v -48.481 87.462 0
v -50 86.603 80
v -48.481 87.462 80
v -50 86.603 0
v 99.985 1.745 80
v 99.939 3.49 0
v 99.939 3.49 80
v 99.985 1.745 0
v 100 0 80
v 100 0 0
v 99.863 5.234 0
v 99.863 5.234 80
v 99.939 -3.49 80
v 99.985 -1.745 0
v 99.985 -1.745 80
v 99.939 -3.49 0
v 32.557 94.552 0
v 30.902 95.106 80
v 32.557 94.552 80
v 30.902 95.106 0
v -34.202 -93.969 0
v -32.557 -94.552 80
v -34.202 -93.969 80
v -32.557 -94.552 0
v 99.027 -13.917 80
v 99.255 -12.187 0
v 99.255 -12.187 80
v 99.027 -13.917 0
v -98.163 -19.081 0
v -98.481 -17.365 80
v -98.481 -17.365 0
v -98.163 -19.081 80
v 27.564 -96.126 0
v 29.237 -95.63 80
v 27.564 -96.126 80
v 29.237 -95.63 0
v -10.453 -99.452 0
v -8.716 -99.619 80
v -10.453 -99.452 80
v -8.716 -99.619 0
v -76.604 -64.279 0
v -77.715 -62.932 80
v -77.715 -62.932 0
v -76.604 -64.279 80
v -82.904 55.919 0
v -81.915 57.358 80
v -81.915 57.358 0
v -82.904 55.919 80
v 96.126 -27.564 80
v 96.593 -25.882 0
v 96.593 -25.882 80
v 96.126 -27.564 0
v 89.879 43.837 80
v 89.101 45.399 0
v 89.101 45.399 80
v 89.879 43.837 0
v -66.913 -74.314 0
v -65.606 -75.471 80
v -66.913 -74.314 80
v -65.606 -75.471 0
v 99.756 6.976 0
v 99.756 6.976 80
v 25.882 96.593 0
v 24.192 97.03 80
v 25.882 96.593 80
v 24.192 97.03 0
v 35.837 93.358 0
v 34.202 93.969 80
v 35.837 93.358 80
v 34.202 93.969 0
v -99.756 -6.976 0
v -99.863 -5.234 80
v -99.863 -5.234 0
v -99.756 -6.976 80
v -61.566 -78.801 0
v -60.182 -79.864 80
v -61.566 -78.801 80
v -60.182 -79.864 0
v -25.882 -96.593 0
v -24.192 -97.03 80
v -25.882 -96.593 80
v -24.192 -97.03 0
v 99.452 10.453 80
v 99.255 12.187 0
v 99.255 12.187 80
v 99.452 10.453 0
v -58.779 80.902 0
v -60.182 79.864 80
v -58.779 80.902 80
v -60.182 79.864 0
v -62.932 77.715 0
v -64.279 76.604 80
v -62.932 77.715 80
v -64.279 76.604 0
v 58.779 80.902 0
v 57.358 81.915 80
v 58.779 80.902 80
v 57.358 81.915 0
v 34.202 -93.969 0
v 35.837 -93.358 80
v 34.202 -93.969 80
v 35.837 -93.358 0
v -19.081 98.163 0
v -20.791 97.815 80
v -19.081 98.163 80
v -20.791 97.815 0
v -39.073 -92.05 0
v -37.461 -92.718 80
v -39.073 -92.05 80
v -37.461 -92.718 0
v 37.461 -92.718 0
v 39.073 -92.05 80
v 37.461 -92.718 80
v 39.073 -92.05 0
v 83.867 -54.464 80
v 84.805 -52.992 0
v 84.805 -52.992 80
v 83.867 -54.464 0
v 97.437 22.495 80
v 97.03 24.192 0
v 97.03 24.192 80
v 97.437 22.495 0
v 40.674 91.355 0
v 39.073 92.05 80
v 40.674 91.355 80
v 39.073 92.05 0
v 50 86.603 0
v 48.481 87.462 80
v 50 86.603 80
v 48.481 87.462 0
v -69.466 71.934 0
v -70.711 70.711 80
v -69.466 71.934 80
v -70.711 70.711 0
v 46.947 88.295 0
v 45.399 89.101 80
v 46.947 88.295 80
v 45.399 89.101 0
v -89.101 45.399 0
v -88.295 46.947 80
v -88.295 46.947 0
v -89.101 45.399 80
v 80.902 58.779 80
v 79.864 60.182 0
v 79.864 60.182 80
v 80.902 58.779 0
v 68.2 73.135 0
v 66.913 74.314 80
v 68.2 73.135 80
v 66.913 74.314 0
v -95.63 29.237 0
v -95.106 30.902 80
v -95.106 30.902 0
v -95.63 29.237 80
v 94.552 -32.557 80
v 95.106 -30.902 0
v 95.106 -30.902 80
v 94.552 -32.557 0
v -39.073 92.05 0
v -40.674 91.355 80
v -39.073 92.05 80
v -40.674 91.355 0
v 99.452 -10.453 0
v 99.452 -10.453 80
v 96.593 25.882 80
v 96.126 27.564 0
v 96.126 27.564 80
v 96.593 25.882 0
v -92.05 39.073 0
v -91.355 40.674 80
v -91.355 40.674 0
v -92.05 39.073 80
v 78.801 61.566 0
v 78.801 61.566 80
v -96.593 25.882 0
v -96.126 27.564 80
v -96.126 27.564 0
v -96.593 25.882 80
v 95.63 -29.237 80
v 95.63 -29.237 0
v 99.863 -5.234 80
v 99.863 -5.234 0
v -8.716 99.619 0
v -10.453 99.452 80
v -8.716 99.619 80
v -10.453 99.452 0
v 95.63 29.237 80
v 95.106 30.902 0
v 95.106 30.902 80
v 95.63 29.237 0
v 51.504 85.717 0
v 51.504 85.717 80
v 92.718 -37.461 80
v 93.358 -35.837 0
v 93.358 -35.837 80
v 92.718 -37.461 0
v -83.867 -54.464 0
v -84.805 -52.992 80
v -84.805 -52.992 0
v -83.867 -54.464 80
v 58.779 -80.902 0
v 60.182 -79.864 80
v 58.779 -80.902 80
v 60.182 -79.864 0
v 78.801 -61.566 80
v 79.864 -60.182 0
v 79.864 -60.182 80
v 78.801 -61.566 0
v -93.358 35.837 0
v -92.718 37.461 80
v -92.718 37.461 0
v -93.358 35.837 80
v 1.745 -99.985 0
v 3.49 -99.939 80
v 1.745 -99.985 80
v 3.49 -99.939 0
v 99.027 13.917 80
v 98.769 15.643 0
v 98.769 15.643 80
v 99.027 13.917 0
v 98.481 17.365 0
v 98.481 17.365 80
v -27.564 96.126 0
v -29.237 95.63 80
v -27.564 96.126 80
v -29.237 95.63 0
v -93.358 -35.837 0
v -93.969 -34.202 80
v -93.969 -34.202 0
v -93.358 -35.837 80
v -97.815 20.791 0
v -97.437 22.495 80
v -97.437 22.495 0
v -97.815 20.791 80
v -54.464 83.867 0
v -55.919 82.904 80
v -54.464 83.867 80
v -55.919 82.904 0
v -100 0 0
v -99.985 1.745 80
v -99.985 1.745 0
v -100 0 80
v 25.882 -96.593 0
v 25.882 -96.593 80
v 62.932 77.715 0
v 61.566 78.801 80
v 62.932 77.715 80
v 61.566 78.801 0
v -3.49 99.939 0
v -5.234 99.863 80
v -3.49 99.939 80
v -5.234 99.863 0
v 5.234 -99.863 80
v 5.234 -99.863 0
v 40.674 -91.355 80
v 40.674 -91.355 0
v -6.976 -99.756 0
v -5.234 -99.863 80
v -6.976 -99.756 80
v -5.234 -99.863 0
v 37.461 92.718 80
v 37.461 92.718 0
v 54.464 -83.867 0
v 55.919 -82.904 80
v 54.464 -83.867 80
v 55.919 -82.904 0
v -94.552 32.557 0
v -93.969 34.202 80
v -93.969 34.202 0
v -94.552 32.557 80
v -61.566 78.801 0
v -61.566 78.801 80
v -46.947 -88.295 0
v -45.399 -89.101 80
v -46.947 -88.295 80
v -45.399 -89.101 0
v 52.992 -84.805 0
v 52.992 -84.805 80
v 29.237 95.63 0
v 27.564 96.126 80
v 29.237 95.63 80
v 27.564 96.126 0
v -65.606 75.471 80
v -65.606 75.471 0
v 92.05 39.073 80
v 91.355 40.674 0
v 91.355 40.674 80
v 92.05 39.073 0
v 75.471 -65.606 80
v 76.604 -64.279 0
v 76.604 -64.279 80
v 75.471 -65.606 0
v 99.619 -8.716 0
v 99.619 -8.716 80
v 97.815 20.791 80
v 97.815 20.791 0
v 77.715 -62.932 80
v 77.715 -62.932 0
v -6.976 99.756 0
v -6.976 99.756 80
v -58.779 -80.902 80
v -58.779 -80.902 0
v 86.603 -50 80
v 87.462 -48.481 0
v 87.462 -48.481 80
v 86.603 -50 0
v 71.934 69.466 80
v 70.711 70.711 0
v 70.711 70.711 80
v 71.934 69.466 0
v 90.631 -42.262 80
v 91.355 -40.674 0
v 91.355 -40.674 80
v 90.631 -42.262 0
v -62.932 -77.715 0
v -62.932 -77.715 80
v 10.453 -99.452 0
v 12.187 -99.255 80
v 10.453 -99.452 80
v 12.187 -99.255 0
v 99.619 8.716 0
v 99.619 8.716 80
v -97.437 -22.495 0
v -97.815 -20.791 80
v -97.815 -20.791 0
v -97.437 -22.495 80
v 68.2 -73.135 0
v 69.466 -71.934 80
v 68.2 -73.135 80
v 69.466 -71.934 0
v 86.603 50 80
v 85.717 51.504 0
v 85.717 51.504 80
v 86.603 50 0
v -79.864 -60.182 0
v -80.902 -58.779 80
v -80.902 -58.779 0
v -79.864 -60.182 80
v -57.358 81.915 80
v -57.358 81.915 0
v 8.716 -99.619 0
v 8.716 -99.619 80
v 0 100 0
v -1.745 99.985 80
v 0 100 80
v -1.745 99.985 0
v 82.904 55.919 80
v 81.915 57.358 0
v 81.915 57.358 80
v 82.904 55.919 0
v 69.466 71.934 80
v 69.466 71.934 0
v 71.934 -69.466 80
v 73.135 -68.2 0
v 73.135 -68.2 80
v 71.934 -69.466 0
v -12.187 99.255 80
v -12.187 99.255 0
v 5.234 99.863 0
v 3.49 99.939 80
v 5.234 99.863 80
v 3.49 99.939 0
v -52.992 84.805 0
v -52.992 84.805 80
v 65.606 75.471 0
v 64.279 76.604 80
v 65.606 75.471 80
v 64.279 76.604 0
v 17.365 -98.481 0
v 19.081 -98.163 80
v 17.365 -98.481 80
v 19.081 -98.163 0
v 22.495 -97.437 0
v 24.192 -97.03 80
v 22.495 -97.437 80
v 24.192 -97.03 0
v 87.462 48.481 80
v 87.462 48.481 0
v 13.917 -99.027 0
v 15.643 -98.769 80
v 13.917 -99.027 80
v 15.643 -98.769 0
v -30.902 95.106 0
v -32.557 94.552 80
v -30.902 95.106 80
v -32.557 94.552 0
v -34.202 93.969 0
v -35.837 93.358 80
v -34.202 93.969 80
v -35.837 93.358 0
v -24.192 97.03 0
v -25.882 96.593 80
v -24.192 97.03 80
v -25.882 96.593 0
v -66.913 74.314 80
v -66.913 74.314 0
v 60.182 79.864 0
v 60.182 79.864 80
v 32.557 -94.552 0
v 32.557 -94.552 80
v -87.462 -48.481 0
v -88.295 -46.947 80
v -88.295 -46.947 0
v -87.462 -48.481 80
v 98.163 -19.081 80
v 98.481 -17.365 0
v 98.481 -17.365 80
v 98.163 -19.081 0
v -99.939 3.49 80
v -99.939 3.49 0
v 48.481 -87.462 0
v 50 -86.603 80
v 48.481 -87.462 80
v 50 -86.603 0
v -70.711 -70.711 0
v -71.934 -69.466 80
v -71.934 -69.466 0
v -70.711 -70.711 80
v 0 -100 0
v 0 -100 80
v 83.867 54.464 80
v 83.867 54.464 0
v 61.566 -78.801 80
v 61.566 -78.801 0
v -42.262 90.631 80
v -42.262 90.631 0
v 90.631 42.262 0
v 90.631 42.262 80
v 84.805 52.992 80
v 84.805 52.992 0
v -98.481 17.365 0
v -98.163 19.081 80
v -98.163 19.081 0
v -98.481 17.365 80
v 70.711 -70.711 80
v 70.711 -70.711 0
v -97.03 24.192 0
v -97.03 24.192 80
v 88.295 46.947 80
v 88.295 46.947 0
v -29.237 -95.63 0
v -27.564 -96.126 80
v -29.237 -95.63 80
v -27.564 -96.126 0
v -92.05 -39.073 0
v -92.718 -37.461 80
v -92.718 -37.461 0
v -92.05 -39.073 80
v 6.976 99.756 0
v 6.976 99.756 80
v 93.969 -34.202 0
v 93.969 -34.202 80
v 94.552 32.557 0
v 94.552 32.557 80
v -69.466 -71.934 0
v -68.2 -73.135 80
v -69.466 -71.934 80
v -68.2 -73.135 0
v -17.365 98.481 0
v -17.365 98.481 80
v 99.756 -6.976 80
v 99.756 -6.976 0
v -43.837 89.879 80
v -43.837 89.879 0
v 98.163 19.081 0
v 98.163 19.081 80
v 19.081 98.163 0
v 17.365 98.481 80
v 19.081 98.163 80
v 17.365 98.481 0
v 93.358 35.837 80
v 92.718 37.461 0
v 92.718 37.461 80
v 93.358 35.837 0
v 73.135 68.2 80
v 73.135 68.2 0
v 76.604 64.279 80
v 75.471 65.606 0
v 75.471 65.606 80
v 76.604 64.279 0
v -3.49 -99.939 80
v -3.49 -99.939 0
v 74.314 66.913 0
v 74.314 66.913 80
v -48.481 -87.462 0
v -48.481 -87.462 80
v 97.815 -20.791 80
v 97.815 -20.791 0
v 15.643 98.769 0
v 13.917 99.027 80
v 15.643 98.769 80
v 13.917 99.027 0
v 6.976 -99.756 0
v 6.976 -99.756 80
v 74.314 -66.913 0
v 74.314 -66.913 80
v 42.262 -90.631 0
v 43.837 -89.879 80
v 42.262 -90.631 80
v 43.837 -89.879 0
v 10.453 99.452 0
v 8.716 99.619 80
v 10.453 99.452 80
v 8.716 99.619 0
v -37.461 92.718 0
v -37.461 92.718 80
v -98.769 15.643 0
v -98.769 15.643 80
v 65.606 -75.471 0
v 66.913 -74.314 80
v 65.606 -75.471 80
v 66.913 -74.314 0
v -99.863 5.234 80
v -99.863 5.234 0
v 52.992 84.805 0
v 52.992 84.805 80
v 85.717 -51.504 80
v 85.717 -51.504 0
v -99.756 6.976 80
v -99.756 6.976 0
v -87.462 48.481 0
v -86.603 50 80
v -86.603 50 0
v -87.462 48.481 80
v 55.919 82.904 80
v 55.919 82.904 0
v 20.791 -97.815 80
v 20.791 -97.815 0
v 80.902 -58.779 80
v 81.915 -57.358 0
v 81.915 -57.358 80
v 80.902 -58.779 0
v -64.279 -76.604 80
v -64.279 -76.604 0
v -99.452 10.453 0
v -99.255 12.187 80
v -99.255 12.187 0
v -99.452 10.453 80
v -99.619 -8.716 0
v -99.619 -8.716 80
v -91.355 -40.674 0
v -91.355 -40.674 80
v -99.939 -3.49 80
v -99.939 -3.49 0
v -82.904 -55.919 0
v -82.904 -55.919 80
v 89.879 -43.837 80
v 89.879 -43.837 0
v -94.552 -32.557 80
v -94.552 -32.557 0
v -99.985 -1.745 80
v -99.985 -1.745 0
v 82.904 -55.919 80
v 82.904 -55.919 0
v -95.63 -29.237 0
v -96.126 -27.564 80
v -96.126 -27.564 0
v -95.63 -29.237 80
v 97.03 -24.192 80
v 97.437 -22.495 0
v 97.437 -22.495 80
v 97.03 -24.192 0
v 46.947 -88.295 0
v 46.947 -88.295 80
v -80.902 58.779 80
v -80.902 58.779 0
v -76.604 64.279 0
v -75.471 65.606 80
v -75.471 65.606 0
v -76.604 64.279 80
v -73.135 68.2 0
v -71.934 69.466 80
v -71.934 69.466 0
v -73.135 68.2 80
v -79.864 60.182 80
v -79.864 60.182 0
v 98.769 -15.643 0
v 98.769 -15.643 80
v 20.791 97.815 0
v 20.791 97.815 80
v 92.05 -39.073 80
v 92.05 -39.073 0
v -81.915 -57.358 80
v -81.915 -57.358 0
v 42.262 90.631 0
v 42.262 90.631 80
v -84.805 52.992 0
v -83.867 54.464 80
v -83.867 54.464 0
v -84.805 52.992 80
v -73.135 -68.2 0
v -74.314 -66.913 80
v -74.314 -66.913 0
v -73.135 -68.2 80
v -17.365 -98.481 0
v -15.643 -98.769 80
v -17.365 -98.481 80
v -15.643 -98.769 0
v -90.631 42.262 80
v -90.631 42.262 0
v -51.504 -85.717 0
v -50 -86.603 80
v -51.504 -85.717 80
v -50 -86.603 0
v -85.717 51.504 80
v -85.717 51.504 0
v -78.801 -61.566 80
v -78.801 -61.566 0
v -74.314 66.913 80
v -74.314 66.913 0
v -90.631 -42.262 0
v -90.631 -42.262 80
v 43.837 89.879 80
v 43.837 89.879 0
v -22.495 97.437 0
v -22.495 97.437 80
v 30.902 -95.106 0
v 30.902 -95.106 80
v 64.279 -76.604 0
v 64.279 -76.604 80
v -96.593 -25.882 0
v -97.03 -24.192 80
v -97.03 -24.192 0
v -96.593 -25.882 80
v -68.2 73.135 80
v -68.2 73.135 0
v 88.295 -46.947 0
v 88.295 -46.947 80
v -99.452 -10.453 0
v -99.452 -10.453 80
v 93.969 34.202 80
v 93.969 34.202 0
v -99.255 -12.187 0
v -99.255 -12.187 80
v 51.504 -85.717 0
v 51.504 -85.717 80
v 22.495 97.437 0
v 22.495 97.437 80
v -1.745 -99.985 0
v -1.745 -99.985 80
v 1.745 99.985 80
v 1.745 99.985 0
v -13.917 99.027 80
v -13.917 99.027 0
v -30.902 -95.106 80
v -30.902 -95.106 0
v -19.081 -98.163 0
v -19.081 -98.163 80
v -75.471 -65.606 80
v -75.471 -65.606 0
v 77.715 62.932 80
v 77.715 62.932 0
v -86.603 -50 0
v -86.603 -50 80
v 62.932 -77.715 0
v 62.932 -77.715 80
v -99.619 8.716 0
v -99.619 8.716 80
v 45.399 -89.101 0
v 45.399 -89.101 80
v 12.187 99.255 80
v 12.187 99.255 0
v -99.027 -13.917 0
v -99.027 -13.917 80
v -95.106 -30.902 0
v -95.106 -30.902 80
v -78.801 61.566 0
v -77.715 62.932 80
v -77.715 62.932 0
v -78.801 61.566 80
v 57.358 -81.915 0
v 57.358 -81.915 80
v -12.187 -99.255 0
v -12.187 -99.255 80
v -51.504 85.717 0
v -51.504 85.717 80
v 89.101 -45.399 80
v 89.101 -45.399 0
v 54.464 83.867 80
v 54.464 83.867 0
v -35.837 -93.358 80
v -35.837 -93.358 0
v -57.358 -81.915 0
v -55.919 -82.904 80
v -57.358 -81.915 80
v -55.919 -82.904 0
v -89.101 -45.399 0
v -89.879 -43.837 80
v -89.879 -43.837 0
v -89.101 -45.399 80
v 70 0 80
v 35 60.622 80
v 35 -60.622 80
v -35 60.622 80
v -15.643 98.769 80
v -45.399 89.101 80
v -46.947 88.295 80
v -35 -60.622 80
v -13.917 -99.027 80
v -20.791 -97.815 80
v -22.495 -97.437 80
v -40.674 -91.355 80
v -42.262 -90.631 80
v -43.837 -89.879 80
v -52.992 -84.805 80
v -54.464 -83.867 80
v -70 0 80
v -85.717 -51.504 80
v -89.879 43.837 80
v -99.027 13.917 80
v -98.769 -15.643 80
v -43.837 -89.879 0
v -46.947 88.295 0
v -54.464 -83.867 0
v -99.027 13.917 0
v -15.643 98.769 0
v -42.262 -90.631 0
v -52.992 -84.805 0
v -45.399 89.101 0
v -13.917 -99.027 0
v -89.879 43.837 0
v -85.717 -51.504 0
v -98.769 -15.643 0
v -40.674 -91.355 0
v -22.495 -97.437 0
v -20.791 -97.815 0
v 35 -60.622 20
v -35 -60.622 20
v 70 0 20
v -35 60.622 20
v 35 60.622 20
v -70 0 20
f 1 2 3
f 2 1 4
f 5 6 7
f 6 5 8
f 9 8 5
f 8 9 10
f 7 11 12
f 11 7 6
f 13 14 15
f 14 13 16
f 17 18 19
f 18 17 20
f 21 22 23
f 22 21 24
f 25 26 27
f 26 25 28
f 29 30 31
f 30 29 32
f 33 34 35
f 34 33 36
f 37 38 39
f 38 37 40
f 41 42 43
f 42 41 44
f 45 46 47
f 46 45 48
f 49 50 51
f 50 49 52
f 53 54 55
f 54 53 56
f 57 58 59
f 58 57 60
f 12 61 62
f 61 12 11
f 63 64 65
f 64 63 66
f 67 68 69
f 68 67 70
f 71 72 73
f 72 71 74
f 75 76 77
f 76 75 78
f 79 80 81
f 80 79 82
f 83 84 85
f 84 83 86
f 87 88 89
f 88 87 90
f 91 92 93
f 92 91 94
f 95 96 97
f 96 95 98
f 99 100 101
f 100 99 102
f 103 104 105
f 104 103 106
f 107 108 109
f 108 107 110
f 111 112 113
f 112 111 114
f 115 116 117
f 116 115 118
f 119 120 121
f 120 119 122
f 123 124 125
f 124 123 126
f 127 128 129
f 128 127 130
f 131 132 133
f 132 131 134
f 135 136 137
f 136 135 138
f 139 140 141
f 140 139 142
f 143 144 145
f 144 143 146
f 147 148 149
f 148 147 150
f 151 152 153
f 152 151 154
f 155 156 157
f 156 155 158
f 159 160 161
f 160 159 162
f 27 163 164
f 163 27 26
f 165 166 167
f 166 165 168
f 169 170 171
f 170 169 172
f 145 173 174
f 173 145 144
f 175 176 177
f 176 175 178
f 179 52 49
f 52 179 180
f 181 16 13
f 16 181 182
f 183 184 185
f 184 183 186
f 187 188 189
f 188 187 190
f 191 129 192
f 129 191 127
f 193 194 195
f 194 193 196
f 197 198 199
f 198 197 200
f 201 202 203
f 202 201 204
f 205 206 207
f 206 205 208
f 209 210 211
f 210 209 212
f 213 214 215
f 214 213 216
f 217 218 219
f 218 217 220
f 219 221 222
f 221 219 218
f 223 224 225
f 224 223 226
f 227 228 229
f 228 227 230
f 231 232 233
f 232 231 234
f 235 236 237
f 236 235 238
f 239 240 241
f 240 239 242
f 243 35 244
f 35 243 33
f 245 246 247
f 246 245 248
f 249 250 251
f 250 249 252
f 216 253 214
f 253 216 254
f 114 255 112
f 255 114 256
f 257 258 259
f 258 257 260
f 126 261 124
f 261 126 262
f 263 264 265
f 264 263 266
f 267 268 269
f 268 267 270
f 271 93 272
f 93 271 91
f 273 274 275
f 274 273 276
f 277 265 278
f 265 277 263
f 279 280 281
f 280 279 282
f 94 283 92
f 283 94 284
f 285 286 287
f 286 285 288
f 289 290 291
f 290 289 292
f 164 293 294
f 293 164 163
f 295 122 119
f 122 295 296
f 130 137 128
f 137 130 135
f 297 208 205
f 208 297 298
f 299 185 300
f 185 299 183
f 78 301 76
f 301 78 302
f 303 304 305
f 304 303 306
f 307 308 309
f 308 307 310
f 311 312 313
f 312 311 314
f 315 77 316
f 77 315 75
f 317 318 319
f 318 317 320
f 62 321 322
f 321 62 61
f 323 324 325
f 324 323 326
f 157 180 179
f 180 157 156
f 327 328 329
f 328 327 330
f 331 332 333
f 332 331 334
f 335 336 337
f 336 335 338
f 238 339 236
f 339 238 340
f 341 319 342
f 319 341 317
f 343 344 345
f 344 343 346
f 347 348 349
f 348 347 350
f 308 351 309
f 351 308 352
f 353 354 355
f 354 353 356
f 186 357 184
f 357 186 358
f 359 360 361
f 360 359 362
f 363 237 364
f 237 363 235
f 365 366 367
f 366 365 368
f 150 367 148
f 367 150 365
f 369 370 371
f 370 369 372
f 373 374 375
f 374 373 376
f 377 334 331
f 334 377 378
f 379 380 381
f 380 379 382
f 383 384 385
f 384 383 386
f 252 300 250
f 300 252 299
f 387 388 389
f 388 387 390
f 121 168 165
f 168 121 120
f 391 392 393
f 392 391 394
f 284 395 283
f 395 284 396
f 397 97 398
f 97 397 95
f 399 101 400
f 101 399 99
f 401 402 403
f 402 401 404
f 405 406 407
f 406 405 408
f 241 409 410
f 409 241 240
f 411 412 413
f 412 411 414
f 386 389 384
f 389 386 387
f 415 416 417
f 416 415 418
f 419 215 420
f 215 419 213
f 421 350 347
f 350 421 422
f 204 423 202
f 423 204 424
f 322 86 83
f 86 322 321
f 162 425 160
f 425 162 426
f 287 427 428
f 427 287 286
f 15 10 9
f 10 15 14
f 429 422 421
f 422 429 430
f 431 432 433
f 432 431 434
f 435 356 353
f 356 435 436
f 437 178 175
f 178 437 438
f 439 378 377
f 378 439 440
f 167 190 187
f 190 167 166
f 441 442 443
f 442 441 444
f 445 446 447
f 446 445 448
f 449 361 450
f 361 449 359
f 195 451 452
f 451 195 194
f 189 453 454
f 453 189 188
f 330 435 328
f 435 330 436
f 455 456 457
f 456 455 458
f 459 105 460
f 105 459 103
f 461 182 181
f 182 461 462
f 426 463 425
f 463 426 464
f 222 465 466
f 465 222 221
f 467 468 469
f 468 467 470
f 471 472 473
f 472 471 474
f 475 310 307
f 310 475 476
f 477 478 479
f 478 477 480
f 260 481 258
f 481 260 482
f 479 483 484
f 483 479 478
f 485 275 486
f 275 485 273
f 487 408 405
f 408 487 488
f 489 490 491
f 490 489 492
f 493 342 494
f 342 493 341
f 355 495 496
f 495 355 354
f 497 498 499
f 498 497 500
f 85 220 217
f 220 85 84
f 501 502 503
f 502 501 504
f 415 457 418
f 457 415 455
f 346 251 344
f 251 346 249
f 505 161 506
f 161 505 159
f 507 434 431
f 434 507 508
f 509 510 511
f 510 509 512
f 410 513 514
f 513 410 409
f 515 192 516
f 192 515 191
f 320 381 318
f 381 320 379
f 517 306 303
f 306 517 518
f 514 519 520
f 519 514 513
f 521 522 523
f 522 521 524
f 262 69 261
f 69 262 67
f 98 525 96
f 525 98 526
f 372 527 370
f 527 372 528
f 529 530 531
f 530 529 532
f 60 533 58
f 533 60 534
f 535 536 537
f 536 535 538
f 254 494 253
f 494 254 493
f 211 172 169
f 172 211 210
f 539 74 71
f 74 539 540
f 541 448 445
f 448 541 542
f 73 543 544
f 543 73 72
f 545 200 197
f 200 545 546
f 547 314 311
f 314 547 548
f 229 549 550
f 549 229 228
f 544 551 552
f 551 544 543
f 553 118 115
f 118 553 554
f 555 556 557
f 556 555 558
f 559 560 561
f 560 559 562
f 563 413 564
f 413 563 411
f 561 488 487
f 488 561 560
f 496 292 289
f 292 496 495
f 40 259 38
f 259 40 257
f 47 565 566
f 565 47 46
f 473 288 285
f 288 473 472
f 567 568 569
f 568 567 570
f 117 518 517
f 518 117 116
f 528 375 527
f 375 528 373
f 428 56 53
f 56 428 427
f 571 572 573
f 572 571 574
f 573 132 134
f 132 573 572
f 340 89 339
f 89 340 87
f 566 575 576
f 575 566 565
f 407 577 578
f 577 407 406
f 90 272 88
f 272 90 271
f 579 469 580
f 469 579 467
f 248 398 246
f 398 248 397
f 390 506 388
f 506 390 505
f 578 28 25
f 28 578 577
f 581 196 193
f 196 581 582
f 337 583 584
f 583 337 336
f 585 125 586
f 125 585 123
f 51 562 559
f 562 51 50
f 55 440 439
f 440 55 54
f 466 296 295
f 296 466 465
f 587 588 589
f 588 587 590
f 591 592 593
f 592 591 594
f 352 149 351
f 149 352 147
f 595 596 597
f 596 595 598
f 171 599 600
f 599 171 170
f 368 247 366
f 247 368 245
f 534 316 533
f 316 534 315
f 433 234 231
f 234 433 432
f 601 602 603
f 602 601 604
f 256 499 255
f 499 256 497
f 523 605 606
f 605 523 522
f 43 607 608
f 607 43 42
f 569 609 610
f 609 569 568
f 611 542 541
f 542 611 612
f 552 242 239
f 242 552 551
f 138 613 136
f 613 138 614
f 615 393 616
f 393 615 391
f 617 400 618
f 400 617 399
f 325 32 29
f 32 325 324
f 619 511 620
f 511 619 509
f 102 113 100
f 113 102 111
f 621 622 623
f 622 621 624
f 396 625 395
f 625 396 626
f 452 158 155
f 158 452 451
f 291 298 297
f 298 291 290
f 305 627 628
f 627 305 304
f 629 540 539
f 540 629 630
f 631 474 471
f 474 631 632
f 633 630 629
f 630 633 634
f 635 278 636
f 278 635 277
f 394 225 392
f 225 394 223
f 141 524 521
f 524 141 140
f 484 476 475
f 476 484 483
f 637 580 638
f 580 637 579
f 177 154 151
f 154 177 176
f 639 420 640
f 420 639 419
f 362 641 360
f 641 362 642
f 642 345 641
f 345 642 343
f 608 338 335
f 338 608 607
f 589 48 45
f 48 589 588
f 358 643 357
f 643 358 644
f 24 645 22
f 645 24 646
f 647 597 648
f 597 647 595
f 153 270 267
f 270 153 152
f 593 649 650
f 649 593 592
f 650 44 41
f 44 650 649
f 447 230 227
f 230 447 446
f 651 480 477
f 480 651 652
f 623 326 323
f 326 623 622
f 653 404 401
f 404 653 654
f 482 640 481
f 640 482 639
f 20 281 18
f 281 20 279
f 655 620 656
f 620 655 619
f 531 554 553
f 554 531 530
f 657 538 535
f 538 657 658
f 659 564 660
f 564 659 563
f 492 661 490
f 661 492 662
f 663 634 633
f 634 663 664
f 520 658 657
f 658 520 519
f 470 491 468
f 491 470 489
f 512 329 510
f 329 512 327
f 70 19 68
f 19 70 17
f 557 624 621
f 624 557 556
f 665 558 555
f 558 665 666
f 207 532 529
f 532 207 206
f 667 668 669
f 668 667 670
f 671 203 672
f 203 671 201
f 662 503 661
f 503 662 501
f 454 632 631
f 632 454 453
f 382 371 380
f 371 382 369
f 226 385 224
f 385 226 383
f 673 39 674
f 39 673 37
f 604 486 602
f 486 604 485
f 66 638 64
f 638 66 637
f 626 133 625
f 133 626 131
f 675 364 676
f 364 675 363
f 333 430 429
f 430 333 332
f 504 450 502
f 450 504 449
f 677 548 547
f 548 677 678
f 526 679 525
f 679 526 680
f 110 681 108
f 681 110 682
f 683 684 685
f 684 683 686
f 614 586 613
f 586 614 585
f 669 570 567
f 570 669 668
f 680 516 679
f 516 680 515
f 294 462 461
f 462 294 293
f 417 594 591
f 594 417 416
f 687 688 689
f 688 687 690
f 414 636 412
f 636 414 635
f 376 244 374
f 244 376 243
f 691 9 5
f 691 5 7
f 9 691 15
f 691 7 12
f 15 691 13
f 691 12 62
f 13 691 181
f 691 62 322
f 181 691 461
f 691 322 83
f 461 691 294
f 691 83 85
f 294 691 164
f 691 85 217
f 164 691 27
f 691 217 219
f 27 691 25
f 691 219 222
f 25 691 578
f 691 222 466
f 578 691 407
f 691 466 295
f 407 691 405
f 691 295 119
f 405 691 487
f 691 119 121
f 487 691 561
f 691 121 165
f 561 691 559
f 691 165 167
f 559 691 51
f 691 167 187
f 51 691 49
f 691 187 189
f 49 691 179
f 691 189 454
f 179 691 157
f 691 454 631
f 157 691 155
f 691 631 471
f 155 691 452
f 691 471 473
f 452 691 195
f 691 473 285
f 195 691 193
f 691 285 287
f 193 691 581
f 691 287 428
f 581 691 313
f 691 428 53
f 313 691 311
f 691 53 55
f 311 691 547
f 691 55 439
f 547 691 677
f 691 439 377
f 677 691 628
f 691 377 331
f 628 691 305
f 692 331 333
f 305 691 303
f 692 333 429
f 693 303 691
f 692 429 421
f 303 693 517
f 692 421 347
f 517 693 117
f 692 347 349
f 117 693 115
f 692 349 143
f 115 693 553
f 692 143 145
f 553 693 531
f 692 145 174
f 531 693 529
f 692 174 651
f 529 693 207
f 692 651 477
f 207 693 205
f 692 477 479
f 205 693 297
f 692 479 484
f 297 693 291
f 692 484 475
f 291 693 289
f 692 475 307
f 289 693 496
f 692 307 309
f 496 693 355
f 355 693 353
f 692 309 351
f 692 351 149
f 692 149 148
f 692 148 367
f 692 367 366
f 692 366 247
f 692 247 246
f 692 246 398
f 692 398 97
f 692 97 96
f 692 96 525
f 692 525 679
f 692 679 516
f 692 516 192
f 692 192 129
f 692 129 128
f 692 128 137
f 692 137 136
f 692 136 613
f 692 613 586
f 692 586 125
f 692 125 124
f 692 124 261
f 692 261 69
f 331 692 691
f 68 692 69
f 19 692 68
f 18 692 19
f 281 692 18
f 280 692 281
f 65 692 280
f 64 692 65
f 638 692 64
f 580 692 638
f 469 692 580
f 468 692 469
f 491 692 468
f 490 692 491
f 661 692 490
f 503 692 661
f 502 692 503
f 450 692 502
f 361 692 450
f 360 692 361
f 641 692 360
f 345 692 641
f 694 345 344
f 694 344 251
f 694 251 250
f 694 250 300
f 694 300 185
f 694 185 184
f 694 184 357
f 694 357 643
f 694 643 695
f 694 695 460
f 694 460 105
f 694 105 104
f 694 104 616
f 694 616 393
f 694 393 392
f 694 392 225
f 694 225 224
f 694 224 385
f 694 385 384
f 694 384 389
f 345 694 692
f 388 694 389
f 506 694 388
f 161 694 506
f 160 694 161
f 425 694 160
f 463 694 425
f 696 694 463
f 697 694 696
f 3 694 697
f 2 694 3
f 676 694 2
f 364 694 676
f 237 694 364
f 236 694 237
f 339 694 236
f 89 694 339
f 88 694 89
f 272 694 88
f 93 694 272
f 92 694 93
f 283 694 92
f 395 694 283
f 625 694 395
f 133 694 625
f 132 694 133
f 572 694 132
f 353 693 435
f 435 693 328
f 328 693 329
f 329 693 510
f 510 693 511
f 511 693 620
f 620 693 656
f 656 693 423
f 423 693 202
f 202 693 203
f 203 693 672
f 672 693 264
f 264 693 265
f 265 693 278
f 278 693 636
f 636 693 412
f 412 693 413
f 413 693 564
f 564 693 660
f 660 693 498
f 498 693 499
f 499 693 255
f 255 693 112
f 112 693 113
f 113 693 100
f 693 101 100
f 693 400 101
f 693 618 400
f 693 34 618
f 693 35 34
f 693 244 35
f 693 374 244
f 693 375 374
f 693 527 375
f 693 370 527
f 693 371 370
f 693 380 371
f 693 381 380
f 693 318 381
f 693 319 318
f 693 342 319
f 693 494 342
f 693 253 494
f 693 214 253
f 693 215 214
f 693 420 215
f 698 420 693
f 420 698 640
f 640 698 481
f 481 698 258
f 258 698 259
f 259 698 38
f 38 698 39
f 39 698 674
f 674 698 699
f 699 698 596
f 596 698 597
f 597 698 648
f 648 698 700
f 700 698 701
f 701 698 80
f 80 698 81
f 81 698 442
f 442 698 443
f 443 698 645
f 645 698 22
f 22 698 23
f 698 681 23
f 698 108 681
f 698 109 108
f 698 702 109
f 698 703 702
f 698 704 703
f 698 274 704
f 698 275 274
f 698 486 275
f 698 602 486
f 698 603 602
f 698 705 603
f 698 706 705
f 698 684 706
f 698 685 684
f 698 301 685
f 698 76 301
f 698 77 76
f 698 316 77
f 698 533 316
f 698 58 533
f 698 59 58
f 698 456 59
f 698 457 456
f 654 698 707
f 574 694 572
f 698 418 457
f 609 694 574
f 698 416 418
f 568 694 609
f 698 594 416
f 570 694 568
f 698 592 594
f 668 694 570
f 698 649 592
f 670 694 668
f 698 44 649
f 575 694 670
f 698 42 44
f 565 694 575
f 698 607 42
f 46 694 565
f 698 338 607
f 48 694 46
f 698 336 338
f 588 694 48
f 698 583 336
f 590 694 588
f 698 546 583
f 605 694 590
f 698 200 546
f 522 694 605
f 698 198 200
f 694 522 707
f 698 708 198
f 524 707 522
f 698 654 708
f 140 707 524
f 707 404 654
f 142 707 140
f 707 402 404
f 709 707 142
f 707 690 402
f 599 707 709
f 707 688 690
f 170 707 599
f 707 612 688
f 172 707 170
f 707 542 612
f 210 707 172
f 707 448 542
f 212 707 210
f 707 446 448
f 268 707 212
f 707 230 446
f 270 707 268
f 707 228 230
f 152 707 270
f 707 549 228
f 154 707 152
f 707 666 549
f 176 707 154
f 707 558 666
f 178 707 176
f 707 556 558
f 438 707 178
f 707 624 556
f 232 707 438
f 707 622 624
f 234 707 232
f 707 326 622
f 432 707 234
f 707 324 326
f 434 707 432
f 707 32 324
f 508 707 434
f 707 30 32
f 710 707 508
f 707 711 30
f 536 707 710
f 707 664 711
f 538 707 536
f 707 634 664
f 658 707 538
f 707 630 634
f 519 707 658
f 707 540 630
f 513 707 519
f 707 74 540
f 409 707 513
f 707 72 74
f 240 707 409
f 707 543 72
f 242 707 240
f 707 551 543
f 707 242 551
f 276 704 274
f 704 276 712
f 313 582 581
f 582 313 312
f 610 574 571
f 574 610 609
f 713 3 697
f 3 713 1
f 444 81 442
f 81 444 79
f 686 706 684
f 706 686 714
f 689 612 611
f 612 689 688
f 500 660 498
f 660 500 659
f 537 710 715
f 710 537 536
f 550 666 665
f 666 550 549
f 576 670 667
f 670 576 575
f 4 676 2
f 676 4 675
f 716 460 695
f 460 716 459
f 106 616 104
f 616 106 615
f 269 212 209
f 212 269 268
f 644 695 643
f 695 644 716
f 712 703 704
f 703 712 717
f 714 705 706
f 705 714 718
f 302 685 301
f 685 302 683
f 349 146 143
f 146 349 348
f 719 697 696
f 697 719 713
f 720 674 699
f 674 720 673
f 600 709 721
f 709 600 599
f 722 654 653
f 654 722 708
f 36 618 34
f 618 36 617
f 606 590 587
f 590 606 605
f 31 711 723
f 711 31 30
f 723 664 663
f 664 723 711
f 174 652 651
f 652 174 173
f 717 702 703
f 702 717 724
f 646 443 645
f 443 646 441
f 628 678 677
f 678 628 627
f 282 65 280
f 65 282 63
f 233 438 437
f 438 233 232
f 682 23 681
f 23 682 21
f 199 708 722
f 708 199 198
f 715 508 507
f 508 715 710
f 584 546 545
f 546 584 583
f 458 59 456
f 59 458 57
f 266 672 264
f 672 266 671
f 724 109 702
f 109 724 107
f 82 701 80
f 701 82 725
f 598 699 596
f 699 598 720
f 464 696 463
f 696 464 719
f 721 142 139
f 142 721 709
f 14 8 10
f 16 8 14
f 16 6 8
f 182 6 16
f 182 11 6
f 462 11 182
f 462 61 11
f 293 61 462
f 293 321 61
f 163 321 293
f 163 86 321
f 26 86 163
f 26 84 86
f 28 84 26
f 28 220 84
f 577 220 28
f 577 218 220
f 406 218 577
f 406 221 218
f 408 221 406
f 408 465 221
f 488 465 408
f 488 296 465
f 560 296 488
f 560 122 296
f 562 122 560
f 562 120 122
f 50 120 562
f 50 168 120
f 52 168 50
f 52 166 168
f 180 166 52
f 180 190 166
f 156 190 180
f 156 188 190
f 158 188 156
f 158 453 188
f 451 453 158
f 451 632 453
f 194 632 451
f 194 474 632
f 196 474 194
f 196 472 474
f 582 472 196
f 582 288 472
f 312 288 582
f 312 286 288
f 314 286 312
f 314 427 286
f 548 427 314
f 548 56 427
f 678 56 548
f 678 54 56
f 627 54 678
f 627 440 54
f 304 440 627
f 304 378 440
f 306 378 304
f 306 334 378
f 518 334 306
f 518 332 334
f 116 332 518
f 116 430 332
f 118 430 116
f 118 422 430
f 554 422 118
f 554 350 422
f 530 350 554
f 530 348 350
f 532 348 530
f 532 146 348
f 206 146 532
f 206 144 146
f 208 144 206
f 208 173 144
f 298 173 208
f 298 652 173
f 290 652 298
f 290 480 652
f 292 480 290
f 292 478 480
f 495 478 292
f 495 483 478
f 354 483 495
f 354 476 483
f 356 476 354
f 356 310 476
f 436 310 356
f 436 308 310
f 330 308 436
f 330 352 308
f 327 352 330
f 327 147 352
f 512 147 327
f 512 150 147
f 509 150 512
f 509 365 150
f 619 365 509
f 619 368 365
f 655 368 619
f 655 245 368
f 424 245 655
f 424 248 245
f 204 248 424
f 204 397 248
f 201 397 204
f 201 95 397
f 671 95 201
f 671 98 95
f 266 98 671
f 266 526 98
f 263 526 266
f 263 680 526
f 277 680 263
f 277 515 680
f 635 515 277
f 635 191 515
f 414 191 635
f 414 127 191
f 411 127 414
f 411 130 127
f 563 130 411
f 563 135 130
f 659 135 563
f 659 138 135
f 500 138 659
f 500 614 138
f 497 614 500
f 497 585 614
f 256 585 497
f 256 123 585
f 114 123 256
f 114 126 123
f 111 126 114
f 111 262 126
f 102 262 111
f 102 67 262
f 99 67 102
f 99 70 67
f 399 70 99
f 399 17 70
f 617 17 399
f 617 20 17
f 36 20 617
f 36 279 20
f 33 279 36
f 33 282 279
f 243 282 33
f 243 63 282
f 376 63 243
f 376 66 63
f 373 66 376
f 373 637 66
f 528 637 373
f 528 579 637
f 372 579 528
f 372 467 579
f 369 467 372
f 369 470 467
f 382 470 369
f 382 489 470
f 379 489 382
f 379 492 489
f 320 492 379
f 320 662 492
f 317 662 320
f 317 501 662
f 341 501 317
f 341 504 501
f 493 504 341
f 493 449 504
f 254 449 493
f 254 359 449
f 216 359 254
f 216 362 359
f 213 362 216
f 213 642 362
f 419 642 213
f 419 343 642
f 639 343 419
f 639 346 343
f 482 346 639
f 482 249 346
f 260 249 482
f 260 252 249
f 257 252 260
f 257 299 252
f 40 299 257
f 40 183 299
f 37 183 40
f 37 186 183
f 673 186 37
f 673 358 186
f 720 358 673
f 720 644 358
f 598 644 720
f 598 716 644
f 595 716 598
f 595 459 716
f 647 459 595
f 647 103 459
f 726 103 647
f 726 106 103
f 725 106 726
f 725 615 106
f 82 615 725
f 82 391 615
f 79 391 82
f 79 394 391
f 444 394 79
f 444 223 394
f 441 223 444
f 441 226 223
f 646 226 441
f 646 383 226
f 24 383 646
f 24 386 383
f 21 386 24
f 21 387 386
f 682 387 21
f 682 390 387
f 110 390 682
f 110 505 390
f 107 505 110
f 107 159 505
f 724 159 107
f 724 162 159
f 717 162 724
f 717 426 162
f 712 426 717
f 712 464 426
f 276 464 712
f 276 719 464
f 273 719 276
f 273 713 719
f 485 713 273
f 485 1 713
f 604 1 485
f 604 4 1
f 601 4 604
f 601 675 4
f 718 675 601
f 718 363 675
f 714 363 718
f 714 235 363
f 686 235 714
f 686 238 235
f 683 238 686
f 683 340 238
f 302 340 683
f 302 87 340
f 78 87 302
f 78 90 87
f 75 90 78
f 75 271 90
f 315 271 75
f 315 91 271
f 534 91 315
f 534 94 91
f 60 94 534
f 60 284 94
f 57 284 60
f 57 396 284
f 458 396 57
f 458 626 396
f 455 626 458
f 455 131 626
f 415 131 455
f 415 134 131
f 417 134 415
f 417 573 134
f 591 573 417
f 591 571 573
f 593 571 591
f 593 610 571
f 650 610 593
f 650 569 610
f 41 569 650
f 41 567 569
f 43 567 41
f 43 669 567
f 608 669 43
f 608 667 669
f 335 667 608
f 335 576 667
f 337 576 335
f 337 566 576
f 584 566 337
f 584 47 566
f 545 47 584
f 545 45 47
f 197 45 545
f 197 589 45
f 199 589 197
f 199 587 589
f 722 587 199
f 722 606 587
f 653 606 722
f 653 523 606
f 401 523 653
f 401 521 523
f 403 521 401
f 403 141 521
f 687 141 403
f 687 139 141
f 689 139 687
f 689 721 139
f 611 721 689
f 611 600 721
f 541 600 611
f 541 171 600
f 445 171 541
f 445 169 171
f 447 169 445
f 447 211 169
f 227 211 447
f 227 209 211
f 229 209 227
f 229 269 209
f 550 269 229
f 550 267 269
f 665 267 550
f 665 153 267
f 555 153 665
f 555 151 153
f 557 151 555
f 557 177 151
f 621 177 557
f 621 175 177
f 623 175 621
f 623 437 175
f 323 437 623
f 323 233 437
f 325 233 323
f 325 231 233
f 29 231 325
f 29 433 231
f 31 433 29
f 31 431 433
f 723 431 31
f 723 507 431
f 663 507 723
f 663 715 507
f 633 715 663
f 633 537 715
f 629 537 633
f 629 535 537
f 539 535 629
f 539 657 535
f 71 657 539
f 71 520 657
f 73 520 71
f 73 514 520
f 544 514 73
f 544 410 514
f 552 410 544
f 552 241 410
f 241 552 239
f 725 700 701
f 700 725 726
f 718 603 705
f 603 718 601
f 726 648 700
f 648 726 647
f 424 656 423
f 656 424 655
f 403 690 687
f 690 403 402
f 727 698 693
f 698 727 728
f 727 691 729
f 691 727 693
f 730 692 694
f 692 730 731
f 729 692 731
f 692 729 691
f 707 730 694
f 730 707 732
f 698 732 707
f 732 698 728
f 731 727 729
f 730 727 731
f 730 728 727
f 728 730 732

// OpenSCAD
headBottom=0;
headHeight = 80;
headWidth = 100;

bitWidth = 70;
bitSides = 6;
bitDepth = 60;

translate([0,0,headBottom])
difference() {
    cylinder( h=headHeight, r=headWidth, $fn=360 );
    
    translate([0,0,headHeight-bitDepth])
    cylinder( h=bitDepth, r=bitWidth, $fn=bitSides );
}
